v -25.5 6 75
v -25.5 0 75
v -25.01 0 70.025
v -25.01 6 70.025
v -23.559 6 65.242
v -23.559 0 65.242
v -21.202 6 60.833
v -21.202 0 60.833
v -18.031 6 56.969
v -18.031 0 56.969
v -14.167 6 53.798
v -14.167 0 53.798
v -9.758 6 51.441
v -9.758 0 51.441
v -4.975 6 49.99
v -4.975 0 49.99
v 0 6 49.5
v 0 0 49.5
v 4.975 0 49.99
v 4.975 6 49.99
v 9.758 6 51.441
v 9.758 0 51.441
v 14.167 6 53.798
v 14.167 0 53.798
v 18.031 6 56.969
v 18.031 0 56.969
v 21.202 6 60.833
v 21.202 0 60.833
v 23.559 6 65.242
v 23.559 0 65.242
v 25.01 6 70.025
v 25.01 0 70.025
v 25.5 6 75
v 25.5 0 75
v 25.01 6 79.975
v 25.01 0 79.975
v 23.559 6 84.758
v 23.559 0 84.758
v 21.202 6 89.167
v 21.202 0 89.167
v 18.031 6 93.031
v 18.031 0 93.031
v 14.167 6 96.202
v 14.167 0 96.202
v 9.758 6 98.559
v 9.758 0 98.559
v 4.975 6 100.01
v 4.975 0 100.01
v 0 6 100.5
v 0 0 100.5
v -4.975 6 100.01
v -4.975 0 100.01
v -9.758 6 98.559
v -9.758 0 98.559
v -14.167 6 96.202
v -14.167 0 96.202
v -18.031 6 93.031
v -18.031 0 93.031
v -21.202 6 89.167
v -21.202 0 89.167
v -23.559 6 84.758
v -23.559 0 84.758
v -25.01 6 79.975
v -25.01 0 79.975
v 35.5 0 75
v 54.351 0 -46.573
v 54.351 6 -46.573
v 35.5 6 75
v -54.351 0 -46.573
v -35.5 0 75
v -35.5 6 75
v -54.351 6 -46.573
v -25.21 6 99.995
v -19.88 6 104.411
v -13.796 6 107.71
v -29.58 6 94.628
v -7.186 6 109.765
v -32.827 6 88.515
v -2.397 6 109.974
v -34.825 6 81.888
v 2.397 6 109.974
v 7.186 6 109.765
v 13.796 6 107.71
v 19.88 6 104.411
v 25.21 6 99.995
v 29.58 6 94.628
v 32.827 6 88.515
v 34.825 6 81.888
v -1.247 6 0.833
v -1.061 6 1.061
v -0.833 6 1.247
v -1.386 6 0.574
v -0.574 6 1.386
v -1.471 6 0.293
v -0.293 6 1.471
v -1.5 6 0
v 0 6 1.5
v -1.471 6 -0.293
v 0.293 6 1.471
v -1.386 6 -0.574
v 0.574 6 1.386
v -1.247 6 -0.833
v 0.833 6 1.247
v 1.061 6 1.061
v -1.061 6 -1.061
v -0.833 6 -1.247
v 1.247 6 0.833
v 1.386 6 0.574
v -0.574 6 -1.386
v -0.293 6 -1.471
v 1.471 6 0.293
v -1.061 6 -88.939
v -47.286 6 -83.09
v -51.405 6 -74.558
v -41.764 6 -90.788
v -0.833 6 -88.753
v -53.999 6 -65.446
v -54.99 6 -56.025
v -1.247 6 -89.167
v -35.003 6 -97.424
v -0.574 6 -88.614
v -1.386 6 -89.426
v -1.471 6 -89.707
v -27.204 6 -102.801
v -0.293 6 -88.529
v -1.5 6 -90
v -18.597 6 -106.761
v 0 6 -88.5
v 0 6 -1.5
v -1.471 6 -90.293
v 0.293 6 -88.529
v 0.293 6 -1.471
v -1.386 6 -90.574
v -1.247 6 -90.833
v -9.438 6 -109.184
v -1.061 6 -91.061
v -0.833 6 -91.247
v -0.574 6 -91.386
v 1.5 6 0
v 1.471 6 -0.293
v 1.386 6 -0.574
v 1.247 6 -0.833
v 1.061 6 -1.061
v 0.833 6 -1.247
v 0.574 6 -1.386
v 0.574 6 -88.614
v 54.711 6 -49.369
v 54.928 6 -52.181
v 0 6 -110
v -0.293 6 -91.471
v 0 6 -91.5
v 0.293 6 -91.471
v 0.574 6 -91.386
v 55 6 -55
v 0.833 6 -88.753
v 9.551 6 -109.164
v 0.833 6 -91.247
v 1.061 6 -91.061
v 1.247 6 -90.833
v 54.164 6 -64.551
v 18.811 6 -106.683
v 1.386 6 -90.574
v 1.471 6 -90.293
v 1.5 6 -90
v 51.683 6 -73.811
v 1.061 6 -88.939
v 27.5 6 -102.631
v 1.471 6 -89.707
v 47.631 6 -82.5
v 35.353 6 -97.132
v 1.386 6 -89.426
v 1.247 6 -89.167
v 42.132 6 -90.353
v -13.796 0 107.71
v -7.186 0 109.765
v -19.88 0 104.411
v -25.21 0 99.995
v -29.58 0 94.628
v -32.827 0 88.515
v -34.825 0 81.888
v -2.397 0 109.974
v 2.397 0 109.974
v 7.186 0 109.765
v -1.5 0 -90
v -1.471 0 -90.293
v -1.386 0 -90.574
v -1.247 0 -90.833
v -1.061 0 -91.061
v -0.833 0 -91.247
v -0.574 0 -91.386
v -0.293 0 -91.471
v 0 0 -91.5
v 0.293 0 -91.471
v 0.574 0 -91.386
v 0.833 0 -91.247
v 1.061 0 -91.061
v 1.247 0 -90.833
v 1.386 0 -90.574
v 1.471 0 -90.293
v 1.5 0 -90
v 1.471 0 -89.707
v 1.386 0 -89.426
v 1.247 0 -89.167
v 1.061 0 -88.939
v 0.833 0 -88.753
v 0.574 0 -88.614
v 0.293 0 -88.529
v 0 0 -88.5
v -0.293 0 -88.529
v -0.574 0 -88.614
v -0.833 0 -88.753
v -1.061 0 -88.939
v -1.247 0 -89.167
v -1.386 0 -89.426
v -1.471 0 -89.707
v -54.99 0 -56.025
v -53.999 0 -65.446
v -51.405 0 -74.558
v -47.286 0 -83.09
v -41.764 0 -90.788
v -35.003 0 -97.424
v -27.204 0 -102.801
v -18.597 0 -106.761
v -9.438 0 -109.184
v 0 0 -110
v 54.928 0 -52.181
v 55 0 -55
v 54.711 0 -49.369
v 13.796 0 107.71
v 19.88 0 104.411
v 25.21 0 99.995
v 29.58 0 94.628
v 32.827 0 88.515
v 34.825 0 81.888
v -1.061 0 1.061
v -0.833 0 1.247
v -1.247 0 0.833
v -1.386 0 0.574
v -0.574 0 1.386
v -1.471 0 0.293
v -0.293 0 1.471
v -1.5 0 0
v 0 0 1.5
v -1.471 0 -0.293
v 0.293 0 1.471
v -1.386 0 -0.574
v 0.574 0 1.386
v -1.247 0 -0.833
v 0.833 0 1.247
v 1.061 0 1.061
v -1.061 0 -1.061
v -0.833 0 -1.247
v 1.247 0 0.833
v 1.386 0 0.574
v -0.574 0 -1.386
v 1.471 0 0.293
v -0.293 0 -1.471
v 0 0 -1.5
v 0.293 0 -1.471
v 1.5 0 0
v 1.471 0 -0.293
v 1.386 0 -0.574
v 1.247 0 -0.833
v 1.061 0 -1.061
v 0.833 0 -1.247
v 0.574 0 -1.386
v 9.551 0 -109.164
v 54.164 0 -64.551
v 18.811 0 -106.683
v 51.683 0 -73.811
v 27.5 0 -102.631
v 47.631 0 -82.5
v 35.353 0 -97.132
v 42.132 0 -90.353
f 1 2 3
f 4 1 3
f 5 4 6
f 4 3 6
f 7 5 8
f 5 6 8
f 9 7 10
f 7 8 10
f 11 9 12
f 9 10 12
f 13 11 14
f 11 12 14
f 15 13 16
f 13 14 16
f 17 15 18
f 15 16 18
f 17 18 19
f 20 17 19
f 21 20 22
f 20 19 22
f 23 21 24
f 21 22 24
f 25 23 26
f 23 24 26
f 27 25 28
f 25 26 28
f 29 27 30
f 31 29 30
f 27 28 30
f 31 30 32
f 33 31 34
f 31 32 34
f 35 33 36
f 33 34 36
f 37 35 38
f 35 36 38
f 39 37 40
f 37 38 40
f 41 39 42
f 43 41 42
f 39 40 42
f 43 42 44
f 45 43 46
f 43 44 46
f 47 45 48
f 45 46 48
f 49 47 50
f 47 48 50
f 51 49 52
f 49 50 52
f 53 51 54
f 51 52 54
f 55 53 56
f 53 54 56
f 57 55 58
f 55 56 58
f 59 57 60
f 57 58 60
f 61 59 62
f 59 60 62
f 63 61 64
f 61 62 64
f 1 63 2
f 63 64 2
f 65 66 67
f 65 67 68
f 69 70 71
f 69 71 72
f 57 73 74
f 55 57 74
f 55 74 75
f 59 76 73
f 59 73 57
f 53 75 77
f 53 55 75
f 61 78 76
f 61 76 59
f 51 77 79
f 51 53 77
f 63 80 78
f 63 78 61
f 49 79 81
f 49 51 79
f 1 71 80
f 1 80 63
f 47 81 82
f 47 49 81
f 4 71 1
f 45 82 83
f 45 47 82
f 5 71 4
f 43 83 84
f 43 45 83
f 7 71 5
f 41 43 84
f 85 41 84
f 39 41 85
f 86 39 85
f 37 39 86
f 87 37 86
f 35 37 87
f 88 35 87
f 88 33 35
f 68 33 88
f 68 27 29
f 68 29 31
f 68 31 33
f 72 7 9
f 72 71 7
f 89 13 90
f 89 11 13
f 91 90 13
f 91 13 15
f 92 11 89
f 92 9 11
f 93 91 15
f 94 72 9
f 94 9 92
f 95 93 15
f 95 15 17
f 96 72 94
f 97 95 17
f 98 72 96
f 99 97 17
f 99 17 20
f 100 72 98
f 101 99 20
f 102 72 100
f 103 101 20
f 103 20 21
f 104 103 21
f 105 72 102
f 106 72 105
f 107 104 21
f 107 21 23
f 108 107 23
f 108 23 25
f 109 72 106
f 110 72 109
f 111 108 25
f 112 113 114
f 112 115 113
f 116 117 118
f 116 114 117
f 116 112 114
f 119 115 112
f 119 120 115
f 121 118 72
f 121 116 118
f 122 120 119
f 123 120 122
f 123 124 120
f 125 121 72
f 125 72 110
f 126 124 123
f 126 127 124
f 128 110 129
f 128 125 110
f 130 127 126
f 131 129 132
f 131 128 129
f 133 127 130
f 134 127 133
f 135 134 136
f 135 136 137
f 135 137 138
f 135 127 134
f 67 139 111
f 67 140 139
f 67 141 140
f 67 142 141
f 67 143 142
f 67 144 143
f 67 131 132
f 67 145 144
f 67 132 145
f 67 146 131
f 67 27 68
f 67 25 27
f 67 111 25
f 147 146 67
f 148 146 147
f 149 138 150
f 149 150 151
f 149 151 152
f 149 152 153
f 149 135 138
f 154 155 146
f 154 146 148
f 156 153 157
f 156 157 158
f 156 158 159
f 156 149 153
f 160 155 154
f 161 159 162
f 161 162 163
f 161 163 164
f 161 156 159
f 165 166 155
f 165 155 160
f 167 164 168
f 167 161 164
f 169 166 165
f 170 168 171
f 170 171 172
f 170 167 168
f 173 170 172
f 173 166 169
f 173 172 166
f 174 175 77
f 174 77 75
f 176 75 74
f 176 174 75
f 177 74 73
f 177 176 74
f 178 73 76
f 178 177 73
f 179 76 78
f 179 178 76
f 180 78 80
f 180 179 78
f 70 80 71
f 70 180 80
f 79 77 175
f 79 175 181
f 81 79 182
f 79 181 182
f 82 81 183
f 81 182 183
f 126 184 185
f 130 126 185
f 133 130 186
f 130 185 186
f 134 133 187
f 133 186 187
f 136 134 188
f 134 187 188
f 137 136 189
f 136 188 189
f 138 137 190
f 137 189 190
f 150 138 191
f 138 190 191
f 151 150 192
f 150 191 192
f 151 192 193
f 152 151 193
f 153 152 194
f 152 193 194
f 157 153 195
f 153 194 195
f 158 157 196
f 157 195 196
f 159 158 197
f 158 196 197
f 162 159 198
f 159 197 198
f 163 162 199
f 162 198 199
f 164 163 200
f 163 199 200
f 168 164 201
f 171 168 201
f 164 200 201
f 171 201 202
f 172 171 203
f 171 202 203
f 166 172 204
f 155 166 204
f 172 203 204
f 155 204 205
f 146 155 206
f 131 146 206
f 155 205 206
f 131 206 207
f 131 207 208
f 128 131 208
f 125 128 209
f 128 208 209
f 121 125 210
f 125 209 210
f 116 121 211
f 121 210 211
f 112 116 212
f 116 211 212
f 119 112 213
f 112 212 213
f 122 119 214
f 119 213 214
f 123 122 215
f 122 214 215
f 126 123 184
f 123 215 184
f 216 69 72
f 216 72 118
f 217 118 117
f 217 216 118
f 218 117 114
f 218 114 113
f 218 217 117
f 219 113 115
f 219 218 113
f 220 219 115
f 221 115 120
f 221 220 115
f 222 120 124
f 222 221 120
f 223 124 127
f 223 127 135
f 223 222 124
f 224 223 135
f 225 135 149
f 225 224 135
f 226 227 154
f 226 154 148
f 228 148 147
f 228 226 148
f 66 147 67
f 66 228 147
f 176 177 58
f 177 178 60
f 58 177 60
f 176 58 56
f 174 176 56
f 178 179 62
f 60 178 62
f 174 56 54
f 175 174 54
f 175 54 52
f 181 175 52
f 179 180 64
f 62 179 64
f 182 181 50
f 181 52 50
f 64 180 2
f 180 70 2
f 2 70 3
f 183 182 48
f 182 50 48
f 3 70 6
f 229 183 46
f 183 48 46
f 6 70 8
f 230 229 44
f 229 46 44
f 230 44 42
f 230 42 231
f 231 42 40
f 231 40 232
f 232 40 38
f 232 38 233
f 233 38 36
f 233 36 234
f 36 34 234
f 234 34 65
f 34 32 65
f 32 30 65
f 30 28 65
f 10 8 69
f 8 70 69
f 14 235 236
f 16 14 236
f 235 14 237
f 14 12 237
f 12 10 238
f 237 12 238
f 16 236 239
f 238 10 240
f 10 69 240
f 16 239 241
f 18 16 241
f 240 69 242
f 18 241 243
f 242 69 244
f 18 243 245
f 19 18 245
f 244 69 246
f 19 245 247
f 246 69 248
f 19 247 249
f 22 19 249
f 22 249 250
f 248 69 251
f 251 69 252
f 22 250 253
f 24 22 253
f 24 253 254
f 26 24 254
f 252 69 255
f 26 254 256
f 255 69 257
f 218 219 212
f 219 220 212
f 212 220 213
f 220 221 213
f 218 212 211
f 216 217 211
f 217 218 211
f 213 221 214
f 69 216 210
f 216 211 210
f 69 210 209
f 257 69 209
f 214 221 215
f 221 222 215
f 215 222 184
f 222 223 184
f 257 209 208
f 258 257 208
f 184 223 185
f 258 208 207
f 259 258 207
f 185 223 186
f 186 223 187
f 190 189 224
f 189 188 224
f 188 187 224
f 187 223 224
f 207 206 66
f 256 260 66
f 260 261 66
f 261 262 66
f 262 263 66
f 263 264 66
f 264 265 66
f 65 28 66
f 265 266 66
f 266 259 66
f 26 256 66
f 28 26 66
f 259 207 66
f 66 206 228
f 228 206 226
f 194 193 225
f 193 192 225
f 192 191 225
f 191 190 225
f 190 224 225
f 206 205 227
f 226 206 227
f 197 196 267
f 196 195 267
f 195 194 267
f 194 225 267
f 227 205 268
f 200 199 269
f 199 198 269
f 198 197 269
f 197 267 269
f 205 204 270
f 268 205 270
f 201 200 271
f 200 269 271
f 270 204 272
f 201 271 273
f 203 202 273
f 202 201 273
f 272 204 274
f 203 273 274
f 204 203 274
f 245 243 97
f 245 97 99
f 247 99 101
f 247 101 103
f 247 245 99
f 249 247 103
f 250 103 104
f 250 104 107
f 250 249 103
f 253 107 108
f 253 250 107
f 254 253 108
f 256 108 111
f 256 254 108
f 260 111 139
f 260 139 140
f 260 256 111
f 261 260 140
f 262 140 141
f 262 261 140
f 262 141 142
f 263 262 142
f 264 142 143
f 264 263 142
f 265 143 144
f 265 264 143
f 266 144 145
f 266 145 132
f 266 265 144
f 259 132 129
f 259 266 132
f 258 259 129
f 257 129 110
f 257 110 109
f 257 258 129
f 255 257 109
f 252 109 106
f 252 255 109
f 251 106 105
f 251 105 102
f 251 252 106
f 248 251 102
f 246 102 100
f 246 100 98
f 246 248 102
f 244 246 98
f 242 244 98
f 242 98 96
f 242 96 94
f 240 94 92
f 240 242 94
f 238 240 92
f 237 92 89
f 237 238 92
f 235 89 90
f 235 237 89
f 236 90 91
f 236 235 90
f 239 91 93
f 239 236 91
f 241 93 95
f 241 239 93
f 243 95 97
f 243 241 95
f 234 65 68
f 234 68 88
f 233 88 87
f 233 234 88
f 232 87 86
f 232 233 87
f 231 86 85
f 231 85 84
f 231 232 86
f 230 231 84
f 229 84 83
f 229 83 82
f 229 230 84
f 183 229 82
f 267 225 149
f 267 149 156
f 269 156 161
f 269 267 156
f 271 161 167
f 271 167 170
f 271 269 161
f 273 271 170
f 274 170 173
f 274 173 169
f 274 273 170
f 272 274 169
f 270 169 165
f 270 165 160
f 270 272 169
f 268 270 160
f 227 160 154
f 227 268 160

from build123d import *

# Parameters (mm, degrees)
SKETCH1_R           = 1.5
BOSS_EXTRUDE1_DEPTH = 6
CUT_EXTRUDE1_START  = -10
CUT_EXTRUDE1_DEPTH  = 10


with BuildPart() as part:
    # Sketch1 → Boss-Extrude1 (new body)
    # profile 1 of 3: a face of its own
    with BuildSketch(Plane(origin=(0, 0, 0), x_dir=(1, 0, 0), z_dir=(0, 1, 0))):
        with BuildLine():
            ThreePointArc((110, 0), (97.61406367, 50.709906072), (63.245553203, 90))
            Line((63.245553203, 90), (1.5, 90))
            ThreePointArc((1.5, 90), (0, 88.5), (-1.5, 90))
            Line((-1.5, 90), (-63.245553203, 90))
            ThreePointArc((-63.245553203, 90), (-109.405676864, 11.419188675), (-80.467384697, -75))
            Line((-80.467384697, -75), (-25.5, -75))
            ThreePointArc((-25.5, -75), (0, -49.5), (25.5, -75))
            Line((25.5, -75), (80.467384697, -75))
            ThreePointArc((80.467384697, -75), (102.350897203, -40.302528973), (110, 0))
        make_face()
        with Locations(Location((0, 0, 0), (0, 0, 270))):
            Circle(SKETCH1_R, mode=Mode.SUBTRACT)
    # profile 2 of 3: a face of its own
    with BuildSketch(Plane(origin=(0, 0, 0), x_dir=(1, 0, 0), z_dir=(0, 1, 0))):
        with BuildLine():
            ThreePointArc((-80.467384697, -75), (0, -110), (80.467384697, -75))
            Line((80.467384697, -75), (25.5, -75))
            ThreePointArc((25.5, -75), (0, -100.5), (-25.5, -75))
            Line((-25.5, -75), (-80.467384697, -75))
        make_face()
    # profile 3 of 3: a face of its own
    with BuildSketch(Plane(origin=(0, 0, 0), x_dir=(1, 0, 0), z_dir=(0, 1, 0))):
        with BuildLine():
            Line((1.5, 90), (63.245553203, 90))
            ThreePointArc((63.245553203, 90), (0, 110), (-63.245553203, 90))
            Line((-63.245553203, 90), (-1.5, 90))
            ThreePointArc((-1.5, 90), (0, 91.5), (1.5, 90))
        make_face()
    extrude(amount=BOSS_EXTRUDE1_DEPTH)

    # Sketch2 → Cut-Extrude1 (cut)
    with BuildSketch(Plane(origin=(0, 6, 0), x_dir=(1, 0, 0), z_dir=(0, 1, 0)).offset(CUT_EXTRUDE1_START)):
        with BuildLine():
            Line((54.350525887, 46.572643608), (35.5, -75))
            ThreePointArc((35.5, -75), (27.52606276, -97.417980929), (7.18642992, -109.765))
            ThreePointArc((7.18642992, -109.765), (80.282337071, -75.198047544), (110, 0))
            ThreePointArc((110, 0), (77.781745816, 77.781746045), (-3.23e-07, 110))
            ThreePointArc((-3.23e-07, 110), (38.890872851, 93.890873079), (55, 55))
            ThreePointArc((55, 55), (54.837391093, 50.773827015), (54.350525887, 46.572643608))
        make_face()
        with BuildLine():
            ThreePointArc((-7.18642992, -109.765), (-27.52606276, -97.417980929), (-35.5, -75))
            Line((-35.5, -75), (-54.350525887, 46.572643608))
            ThreePointArc((-54.350525887, 46.572643608), (-41.764246786, 90.787535406), (-3.23e-07, 110))
            ThreePointArc((-3.23e-07, 110), (-109.941234308, 3.595135441), (-7.18642992, -109.765))
        make_face()
    extrude(amount=CUT_EXTRUDE1_DEPTH, mode=Mode.SUBTRACT)


solid = part.part
